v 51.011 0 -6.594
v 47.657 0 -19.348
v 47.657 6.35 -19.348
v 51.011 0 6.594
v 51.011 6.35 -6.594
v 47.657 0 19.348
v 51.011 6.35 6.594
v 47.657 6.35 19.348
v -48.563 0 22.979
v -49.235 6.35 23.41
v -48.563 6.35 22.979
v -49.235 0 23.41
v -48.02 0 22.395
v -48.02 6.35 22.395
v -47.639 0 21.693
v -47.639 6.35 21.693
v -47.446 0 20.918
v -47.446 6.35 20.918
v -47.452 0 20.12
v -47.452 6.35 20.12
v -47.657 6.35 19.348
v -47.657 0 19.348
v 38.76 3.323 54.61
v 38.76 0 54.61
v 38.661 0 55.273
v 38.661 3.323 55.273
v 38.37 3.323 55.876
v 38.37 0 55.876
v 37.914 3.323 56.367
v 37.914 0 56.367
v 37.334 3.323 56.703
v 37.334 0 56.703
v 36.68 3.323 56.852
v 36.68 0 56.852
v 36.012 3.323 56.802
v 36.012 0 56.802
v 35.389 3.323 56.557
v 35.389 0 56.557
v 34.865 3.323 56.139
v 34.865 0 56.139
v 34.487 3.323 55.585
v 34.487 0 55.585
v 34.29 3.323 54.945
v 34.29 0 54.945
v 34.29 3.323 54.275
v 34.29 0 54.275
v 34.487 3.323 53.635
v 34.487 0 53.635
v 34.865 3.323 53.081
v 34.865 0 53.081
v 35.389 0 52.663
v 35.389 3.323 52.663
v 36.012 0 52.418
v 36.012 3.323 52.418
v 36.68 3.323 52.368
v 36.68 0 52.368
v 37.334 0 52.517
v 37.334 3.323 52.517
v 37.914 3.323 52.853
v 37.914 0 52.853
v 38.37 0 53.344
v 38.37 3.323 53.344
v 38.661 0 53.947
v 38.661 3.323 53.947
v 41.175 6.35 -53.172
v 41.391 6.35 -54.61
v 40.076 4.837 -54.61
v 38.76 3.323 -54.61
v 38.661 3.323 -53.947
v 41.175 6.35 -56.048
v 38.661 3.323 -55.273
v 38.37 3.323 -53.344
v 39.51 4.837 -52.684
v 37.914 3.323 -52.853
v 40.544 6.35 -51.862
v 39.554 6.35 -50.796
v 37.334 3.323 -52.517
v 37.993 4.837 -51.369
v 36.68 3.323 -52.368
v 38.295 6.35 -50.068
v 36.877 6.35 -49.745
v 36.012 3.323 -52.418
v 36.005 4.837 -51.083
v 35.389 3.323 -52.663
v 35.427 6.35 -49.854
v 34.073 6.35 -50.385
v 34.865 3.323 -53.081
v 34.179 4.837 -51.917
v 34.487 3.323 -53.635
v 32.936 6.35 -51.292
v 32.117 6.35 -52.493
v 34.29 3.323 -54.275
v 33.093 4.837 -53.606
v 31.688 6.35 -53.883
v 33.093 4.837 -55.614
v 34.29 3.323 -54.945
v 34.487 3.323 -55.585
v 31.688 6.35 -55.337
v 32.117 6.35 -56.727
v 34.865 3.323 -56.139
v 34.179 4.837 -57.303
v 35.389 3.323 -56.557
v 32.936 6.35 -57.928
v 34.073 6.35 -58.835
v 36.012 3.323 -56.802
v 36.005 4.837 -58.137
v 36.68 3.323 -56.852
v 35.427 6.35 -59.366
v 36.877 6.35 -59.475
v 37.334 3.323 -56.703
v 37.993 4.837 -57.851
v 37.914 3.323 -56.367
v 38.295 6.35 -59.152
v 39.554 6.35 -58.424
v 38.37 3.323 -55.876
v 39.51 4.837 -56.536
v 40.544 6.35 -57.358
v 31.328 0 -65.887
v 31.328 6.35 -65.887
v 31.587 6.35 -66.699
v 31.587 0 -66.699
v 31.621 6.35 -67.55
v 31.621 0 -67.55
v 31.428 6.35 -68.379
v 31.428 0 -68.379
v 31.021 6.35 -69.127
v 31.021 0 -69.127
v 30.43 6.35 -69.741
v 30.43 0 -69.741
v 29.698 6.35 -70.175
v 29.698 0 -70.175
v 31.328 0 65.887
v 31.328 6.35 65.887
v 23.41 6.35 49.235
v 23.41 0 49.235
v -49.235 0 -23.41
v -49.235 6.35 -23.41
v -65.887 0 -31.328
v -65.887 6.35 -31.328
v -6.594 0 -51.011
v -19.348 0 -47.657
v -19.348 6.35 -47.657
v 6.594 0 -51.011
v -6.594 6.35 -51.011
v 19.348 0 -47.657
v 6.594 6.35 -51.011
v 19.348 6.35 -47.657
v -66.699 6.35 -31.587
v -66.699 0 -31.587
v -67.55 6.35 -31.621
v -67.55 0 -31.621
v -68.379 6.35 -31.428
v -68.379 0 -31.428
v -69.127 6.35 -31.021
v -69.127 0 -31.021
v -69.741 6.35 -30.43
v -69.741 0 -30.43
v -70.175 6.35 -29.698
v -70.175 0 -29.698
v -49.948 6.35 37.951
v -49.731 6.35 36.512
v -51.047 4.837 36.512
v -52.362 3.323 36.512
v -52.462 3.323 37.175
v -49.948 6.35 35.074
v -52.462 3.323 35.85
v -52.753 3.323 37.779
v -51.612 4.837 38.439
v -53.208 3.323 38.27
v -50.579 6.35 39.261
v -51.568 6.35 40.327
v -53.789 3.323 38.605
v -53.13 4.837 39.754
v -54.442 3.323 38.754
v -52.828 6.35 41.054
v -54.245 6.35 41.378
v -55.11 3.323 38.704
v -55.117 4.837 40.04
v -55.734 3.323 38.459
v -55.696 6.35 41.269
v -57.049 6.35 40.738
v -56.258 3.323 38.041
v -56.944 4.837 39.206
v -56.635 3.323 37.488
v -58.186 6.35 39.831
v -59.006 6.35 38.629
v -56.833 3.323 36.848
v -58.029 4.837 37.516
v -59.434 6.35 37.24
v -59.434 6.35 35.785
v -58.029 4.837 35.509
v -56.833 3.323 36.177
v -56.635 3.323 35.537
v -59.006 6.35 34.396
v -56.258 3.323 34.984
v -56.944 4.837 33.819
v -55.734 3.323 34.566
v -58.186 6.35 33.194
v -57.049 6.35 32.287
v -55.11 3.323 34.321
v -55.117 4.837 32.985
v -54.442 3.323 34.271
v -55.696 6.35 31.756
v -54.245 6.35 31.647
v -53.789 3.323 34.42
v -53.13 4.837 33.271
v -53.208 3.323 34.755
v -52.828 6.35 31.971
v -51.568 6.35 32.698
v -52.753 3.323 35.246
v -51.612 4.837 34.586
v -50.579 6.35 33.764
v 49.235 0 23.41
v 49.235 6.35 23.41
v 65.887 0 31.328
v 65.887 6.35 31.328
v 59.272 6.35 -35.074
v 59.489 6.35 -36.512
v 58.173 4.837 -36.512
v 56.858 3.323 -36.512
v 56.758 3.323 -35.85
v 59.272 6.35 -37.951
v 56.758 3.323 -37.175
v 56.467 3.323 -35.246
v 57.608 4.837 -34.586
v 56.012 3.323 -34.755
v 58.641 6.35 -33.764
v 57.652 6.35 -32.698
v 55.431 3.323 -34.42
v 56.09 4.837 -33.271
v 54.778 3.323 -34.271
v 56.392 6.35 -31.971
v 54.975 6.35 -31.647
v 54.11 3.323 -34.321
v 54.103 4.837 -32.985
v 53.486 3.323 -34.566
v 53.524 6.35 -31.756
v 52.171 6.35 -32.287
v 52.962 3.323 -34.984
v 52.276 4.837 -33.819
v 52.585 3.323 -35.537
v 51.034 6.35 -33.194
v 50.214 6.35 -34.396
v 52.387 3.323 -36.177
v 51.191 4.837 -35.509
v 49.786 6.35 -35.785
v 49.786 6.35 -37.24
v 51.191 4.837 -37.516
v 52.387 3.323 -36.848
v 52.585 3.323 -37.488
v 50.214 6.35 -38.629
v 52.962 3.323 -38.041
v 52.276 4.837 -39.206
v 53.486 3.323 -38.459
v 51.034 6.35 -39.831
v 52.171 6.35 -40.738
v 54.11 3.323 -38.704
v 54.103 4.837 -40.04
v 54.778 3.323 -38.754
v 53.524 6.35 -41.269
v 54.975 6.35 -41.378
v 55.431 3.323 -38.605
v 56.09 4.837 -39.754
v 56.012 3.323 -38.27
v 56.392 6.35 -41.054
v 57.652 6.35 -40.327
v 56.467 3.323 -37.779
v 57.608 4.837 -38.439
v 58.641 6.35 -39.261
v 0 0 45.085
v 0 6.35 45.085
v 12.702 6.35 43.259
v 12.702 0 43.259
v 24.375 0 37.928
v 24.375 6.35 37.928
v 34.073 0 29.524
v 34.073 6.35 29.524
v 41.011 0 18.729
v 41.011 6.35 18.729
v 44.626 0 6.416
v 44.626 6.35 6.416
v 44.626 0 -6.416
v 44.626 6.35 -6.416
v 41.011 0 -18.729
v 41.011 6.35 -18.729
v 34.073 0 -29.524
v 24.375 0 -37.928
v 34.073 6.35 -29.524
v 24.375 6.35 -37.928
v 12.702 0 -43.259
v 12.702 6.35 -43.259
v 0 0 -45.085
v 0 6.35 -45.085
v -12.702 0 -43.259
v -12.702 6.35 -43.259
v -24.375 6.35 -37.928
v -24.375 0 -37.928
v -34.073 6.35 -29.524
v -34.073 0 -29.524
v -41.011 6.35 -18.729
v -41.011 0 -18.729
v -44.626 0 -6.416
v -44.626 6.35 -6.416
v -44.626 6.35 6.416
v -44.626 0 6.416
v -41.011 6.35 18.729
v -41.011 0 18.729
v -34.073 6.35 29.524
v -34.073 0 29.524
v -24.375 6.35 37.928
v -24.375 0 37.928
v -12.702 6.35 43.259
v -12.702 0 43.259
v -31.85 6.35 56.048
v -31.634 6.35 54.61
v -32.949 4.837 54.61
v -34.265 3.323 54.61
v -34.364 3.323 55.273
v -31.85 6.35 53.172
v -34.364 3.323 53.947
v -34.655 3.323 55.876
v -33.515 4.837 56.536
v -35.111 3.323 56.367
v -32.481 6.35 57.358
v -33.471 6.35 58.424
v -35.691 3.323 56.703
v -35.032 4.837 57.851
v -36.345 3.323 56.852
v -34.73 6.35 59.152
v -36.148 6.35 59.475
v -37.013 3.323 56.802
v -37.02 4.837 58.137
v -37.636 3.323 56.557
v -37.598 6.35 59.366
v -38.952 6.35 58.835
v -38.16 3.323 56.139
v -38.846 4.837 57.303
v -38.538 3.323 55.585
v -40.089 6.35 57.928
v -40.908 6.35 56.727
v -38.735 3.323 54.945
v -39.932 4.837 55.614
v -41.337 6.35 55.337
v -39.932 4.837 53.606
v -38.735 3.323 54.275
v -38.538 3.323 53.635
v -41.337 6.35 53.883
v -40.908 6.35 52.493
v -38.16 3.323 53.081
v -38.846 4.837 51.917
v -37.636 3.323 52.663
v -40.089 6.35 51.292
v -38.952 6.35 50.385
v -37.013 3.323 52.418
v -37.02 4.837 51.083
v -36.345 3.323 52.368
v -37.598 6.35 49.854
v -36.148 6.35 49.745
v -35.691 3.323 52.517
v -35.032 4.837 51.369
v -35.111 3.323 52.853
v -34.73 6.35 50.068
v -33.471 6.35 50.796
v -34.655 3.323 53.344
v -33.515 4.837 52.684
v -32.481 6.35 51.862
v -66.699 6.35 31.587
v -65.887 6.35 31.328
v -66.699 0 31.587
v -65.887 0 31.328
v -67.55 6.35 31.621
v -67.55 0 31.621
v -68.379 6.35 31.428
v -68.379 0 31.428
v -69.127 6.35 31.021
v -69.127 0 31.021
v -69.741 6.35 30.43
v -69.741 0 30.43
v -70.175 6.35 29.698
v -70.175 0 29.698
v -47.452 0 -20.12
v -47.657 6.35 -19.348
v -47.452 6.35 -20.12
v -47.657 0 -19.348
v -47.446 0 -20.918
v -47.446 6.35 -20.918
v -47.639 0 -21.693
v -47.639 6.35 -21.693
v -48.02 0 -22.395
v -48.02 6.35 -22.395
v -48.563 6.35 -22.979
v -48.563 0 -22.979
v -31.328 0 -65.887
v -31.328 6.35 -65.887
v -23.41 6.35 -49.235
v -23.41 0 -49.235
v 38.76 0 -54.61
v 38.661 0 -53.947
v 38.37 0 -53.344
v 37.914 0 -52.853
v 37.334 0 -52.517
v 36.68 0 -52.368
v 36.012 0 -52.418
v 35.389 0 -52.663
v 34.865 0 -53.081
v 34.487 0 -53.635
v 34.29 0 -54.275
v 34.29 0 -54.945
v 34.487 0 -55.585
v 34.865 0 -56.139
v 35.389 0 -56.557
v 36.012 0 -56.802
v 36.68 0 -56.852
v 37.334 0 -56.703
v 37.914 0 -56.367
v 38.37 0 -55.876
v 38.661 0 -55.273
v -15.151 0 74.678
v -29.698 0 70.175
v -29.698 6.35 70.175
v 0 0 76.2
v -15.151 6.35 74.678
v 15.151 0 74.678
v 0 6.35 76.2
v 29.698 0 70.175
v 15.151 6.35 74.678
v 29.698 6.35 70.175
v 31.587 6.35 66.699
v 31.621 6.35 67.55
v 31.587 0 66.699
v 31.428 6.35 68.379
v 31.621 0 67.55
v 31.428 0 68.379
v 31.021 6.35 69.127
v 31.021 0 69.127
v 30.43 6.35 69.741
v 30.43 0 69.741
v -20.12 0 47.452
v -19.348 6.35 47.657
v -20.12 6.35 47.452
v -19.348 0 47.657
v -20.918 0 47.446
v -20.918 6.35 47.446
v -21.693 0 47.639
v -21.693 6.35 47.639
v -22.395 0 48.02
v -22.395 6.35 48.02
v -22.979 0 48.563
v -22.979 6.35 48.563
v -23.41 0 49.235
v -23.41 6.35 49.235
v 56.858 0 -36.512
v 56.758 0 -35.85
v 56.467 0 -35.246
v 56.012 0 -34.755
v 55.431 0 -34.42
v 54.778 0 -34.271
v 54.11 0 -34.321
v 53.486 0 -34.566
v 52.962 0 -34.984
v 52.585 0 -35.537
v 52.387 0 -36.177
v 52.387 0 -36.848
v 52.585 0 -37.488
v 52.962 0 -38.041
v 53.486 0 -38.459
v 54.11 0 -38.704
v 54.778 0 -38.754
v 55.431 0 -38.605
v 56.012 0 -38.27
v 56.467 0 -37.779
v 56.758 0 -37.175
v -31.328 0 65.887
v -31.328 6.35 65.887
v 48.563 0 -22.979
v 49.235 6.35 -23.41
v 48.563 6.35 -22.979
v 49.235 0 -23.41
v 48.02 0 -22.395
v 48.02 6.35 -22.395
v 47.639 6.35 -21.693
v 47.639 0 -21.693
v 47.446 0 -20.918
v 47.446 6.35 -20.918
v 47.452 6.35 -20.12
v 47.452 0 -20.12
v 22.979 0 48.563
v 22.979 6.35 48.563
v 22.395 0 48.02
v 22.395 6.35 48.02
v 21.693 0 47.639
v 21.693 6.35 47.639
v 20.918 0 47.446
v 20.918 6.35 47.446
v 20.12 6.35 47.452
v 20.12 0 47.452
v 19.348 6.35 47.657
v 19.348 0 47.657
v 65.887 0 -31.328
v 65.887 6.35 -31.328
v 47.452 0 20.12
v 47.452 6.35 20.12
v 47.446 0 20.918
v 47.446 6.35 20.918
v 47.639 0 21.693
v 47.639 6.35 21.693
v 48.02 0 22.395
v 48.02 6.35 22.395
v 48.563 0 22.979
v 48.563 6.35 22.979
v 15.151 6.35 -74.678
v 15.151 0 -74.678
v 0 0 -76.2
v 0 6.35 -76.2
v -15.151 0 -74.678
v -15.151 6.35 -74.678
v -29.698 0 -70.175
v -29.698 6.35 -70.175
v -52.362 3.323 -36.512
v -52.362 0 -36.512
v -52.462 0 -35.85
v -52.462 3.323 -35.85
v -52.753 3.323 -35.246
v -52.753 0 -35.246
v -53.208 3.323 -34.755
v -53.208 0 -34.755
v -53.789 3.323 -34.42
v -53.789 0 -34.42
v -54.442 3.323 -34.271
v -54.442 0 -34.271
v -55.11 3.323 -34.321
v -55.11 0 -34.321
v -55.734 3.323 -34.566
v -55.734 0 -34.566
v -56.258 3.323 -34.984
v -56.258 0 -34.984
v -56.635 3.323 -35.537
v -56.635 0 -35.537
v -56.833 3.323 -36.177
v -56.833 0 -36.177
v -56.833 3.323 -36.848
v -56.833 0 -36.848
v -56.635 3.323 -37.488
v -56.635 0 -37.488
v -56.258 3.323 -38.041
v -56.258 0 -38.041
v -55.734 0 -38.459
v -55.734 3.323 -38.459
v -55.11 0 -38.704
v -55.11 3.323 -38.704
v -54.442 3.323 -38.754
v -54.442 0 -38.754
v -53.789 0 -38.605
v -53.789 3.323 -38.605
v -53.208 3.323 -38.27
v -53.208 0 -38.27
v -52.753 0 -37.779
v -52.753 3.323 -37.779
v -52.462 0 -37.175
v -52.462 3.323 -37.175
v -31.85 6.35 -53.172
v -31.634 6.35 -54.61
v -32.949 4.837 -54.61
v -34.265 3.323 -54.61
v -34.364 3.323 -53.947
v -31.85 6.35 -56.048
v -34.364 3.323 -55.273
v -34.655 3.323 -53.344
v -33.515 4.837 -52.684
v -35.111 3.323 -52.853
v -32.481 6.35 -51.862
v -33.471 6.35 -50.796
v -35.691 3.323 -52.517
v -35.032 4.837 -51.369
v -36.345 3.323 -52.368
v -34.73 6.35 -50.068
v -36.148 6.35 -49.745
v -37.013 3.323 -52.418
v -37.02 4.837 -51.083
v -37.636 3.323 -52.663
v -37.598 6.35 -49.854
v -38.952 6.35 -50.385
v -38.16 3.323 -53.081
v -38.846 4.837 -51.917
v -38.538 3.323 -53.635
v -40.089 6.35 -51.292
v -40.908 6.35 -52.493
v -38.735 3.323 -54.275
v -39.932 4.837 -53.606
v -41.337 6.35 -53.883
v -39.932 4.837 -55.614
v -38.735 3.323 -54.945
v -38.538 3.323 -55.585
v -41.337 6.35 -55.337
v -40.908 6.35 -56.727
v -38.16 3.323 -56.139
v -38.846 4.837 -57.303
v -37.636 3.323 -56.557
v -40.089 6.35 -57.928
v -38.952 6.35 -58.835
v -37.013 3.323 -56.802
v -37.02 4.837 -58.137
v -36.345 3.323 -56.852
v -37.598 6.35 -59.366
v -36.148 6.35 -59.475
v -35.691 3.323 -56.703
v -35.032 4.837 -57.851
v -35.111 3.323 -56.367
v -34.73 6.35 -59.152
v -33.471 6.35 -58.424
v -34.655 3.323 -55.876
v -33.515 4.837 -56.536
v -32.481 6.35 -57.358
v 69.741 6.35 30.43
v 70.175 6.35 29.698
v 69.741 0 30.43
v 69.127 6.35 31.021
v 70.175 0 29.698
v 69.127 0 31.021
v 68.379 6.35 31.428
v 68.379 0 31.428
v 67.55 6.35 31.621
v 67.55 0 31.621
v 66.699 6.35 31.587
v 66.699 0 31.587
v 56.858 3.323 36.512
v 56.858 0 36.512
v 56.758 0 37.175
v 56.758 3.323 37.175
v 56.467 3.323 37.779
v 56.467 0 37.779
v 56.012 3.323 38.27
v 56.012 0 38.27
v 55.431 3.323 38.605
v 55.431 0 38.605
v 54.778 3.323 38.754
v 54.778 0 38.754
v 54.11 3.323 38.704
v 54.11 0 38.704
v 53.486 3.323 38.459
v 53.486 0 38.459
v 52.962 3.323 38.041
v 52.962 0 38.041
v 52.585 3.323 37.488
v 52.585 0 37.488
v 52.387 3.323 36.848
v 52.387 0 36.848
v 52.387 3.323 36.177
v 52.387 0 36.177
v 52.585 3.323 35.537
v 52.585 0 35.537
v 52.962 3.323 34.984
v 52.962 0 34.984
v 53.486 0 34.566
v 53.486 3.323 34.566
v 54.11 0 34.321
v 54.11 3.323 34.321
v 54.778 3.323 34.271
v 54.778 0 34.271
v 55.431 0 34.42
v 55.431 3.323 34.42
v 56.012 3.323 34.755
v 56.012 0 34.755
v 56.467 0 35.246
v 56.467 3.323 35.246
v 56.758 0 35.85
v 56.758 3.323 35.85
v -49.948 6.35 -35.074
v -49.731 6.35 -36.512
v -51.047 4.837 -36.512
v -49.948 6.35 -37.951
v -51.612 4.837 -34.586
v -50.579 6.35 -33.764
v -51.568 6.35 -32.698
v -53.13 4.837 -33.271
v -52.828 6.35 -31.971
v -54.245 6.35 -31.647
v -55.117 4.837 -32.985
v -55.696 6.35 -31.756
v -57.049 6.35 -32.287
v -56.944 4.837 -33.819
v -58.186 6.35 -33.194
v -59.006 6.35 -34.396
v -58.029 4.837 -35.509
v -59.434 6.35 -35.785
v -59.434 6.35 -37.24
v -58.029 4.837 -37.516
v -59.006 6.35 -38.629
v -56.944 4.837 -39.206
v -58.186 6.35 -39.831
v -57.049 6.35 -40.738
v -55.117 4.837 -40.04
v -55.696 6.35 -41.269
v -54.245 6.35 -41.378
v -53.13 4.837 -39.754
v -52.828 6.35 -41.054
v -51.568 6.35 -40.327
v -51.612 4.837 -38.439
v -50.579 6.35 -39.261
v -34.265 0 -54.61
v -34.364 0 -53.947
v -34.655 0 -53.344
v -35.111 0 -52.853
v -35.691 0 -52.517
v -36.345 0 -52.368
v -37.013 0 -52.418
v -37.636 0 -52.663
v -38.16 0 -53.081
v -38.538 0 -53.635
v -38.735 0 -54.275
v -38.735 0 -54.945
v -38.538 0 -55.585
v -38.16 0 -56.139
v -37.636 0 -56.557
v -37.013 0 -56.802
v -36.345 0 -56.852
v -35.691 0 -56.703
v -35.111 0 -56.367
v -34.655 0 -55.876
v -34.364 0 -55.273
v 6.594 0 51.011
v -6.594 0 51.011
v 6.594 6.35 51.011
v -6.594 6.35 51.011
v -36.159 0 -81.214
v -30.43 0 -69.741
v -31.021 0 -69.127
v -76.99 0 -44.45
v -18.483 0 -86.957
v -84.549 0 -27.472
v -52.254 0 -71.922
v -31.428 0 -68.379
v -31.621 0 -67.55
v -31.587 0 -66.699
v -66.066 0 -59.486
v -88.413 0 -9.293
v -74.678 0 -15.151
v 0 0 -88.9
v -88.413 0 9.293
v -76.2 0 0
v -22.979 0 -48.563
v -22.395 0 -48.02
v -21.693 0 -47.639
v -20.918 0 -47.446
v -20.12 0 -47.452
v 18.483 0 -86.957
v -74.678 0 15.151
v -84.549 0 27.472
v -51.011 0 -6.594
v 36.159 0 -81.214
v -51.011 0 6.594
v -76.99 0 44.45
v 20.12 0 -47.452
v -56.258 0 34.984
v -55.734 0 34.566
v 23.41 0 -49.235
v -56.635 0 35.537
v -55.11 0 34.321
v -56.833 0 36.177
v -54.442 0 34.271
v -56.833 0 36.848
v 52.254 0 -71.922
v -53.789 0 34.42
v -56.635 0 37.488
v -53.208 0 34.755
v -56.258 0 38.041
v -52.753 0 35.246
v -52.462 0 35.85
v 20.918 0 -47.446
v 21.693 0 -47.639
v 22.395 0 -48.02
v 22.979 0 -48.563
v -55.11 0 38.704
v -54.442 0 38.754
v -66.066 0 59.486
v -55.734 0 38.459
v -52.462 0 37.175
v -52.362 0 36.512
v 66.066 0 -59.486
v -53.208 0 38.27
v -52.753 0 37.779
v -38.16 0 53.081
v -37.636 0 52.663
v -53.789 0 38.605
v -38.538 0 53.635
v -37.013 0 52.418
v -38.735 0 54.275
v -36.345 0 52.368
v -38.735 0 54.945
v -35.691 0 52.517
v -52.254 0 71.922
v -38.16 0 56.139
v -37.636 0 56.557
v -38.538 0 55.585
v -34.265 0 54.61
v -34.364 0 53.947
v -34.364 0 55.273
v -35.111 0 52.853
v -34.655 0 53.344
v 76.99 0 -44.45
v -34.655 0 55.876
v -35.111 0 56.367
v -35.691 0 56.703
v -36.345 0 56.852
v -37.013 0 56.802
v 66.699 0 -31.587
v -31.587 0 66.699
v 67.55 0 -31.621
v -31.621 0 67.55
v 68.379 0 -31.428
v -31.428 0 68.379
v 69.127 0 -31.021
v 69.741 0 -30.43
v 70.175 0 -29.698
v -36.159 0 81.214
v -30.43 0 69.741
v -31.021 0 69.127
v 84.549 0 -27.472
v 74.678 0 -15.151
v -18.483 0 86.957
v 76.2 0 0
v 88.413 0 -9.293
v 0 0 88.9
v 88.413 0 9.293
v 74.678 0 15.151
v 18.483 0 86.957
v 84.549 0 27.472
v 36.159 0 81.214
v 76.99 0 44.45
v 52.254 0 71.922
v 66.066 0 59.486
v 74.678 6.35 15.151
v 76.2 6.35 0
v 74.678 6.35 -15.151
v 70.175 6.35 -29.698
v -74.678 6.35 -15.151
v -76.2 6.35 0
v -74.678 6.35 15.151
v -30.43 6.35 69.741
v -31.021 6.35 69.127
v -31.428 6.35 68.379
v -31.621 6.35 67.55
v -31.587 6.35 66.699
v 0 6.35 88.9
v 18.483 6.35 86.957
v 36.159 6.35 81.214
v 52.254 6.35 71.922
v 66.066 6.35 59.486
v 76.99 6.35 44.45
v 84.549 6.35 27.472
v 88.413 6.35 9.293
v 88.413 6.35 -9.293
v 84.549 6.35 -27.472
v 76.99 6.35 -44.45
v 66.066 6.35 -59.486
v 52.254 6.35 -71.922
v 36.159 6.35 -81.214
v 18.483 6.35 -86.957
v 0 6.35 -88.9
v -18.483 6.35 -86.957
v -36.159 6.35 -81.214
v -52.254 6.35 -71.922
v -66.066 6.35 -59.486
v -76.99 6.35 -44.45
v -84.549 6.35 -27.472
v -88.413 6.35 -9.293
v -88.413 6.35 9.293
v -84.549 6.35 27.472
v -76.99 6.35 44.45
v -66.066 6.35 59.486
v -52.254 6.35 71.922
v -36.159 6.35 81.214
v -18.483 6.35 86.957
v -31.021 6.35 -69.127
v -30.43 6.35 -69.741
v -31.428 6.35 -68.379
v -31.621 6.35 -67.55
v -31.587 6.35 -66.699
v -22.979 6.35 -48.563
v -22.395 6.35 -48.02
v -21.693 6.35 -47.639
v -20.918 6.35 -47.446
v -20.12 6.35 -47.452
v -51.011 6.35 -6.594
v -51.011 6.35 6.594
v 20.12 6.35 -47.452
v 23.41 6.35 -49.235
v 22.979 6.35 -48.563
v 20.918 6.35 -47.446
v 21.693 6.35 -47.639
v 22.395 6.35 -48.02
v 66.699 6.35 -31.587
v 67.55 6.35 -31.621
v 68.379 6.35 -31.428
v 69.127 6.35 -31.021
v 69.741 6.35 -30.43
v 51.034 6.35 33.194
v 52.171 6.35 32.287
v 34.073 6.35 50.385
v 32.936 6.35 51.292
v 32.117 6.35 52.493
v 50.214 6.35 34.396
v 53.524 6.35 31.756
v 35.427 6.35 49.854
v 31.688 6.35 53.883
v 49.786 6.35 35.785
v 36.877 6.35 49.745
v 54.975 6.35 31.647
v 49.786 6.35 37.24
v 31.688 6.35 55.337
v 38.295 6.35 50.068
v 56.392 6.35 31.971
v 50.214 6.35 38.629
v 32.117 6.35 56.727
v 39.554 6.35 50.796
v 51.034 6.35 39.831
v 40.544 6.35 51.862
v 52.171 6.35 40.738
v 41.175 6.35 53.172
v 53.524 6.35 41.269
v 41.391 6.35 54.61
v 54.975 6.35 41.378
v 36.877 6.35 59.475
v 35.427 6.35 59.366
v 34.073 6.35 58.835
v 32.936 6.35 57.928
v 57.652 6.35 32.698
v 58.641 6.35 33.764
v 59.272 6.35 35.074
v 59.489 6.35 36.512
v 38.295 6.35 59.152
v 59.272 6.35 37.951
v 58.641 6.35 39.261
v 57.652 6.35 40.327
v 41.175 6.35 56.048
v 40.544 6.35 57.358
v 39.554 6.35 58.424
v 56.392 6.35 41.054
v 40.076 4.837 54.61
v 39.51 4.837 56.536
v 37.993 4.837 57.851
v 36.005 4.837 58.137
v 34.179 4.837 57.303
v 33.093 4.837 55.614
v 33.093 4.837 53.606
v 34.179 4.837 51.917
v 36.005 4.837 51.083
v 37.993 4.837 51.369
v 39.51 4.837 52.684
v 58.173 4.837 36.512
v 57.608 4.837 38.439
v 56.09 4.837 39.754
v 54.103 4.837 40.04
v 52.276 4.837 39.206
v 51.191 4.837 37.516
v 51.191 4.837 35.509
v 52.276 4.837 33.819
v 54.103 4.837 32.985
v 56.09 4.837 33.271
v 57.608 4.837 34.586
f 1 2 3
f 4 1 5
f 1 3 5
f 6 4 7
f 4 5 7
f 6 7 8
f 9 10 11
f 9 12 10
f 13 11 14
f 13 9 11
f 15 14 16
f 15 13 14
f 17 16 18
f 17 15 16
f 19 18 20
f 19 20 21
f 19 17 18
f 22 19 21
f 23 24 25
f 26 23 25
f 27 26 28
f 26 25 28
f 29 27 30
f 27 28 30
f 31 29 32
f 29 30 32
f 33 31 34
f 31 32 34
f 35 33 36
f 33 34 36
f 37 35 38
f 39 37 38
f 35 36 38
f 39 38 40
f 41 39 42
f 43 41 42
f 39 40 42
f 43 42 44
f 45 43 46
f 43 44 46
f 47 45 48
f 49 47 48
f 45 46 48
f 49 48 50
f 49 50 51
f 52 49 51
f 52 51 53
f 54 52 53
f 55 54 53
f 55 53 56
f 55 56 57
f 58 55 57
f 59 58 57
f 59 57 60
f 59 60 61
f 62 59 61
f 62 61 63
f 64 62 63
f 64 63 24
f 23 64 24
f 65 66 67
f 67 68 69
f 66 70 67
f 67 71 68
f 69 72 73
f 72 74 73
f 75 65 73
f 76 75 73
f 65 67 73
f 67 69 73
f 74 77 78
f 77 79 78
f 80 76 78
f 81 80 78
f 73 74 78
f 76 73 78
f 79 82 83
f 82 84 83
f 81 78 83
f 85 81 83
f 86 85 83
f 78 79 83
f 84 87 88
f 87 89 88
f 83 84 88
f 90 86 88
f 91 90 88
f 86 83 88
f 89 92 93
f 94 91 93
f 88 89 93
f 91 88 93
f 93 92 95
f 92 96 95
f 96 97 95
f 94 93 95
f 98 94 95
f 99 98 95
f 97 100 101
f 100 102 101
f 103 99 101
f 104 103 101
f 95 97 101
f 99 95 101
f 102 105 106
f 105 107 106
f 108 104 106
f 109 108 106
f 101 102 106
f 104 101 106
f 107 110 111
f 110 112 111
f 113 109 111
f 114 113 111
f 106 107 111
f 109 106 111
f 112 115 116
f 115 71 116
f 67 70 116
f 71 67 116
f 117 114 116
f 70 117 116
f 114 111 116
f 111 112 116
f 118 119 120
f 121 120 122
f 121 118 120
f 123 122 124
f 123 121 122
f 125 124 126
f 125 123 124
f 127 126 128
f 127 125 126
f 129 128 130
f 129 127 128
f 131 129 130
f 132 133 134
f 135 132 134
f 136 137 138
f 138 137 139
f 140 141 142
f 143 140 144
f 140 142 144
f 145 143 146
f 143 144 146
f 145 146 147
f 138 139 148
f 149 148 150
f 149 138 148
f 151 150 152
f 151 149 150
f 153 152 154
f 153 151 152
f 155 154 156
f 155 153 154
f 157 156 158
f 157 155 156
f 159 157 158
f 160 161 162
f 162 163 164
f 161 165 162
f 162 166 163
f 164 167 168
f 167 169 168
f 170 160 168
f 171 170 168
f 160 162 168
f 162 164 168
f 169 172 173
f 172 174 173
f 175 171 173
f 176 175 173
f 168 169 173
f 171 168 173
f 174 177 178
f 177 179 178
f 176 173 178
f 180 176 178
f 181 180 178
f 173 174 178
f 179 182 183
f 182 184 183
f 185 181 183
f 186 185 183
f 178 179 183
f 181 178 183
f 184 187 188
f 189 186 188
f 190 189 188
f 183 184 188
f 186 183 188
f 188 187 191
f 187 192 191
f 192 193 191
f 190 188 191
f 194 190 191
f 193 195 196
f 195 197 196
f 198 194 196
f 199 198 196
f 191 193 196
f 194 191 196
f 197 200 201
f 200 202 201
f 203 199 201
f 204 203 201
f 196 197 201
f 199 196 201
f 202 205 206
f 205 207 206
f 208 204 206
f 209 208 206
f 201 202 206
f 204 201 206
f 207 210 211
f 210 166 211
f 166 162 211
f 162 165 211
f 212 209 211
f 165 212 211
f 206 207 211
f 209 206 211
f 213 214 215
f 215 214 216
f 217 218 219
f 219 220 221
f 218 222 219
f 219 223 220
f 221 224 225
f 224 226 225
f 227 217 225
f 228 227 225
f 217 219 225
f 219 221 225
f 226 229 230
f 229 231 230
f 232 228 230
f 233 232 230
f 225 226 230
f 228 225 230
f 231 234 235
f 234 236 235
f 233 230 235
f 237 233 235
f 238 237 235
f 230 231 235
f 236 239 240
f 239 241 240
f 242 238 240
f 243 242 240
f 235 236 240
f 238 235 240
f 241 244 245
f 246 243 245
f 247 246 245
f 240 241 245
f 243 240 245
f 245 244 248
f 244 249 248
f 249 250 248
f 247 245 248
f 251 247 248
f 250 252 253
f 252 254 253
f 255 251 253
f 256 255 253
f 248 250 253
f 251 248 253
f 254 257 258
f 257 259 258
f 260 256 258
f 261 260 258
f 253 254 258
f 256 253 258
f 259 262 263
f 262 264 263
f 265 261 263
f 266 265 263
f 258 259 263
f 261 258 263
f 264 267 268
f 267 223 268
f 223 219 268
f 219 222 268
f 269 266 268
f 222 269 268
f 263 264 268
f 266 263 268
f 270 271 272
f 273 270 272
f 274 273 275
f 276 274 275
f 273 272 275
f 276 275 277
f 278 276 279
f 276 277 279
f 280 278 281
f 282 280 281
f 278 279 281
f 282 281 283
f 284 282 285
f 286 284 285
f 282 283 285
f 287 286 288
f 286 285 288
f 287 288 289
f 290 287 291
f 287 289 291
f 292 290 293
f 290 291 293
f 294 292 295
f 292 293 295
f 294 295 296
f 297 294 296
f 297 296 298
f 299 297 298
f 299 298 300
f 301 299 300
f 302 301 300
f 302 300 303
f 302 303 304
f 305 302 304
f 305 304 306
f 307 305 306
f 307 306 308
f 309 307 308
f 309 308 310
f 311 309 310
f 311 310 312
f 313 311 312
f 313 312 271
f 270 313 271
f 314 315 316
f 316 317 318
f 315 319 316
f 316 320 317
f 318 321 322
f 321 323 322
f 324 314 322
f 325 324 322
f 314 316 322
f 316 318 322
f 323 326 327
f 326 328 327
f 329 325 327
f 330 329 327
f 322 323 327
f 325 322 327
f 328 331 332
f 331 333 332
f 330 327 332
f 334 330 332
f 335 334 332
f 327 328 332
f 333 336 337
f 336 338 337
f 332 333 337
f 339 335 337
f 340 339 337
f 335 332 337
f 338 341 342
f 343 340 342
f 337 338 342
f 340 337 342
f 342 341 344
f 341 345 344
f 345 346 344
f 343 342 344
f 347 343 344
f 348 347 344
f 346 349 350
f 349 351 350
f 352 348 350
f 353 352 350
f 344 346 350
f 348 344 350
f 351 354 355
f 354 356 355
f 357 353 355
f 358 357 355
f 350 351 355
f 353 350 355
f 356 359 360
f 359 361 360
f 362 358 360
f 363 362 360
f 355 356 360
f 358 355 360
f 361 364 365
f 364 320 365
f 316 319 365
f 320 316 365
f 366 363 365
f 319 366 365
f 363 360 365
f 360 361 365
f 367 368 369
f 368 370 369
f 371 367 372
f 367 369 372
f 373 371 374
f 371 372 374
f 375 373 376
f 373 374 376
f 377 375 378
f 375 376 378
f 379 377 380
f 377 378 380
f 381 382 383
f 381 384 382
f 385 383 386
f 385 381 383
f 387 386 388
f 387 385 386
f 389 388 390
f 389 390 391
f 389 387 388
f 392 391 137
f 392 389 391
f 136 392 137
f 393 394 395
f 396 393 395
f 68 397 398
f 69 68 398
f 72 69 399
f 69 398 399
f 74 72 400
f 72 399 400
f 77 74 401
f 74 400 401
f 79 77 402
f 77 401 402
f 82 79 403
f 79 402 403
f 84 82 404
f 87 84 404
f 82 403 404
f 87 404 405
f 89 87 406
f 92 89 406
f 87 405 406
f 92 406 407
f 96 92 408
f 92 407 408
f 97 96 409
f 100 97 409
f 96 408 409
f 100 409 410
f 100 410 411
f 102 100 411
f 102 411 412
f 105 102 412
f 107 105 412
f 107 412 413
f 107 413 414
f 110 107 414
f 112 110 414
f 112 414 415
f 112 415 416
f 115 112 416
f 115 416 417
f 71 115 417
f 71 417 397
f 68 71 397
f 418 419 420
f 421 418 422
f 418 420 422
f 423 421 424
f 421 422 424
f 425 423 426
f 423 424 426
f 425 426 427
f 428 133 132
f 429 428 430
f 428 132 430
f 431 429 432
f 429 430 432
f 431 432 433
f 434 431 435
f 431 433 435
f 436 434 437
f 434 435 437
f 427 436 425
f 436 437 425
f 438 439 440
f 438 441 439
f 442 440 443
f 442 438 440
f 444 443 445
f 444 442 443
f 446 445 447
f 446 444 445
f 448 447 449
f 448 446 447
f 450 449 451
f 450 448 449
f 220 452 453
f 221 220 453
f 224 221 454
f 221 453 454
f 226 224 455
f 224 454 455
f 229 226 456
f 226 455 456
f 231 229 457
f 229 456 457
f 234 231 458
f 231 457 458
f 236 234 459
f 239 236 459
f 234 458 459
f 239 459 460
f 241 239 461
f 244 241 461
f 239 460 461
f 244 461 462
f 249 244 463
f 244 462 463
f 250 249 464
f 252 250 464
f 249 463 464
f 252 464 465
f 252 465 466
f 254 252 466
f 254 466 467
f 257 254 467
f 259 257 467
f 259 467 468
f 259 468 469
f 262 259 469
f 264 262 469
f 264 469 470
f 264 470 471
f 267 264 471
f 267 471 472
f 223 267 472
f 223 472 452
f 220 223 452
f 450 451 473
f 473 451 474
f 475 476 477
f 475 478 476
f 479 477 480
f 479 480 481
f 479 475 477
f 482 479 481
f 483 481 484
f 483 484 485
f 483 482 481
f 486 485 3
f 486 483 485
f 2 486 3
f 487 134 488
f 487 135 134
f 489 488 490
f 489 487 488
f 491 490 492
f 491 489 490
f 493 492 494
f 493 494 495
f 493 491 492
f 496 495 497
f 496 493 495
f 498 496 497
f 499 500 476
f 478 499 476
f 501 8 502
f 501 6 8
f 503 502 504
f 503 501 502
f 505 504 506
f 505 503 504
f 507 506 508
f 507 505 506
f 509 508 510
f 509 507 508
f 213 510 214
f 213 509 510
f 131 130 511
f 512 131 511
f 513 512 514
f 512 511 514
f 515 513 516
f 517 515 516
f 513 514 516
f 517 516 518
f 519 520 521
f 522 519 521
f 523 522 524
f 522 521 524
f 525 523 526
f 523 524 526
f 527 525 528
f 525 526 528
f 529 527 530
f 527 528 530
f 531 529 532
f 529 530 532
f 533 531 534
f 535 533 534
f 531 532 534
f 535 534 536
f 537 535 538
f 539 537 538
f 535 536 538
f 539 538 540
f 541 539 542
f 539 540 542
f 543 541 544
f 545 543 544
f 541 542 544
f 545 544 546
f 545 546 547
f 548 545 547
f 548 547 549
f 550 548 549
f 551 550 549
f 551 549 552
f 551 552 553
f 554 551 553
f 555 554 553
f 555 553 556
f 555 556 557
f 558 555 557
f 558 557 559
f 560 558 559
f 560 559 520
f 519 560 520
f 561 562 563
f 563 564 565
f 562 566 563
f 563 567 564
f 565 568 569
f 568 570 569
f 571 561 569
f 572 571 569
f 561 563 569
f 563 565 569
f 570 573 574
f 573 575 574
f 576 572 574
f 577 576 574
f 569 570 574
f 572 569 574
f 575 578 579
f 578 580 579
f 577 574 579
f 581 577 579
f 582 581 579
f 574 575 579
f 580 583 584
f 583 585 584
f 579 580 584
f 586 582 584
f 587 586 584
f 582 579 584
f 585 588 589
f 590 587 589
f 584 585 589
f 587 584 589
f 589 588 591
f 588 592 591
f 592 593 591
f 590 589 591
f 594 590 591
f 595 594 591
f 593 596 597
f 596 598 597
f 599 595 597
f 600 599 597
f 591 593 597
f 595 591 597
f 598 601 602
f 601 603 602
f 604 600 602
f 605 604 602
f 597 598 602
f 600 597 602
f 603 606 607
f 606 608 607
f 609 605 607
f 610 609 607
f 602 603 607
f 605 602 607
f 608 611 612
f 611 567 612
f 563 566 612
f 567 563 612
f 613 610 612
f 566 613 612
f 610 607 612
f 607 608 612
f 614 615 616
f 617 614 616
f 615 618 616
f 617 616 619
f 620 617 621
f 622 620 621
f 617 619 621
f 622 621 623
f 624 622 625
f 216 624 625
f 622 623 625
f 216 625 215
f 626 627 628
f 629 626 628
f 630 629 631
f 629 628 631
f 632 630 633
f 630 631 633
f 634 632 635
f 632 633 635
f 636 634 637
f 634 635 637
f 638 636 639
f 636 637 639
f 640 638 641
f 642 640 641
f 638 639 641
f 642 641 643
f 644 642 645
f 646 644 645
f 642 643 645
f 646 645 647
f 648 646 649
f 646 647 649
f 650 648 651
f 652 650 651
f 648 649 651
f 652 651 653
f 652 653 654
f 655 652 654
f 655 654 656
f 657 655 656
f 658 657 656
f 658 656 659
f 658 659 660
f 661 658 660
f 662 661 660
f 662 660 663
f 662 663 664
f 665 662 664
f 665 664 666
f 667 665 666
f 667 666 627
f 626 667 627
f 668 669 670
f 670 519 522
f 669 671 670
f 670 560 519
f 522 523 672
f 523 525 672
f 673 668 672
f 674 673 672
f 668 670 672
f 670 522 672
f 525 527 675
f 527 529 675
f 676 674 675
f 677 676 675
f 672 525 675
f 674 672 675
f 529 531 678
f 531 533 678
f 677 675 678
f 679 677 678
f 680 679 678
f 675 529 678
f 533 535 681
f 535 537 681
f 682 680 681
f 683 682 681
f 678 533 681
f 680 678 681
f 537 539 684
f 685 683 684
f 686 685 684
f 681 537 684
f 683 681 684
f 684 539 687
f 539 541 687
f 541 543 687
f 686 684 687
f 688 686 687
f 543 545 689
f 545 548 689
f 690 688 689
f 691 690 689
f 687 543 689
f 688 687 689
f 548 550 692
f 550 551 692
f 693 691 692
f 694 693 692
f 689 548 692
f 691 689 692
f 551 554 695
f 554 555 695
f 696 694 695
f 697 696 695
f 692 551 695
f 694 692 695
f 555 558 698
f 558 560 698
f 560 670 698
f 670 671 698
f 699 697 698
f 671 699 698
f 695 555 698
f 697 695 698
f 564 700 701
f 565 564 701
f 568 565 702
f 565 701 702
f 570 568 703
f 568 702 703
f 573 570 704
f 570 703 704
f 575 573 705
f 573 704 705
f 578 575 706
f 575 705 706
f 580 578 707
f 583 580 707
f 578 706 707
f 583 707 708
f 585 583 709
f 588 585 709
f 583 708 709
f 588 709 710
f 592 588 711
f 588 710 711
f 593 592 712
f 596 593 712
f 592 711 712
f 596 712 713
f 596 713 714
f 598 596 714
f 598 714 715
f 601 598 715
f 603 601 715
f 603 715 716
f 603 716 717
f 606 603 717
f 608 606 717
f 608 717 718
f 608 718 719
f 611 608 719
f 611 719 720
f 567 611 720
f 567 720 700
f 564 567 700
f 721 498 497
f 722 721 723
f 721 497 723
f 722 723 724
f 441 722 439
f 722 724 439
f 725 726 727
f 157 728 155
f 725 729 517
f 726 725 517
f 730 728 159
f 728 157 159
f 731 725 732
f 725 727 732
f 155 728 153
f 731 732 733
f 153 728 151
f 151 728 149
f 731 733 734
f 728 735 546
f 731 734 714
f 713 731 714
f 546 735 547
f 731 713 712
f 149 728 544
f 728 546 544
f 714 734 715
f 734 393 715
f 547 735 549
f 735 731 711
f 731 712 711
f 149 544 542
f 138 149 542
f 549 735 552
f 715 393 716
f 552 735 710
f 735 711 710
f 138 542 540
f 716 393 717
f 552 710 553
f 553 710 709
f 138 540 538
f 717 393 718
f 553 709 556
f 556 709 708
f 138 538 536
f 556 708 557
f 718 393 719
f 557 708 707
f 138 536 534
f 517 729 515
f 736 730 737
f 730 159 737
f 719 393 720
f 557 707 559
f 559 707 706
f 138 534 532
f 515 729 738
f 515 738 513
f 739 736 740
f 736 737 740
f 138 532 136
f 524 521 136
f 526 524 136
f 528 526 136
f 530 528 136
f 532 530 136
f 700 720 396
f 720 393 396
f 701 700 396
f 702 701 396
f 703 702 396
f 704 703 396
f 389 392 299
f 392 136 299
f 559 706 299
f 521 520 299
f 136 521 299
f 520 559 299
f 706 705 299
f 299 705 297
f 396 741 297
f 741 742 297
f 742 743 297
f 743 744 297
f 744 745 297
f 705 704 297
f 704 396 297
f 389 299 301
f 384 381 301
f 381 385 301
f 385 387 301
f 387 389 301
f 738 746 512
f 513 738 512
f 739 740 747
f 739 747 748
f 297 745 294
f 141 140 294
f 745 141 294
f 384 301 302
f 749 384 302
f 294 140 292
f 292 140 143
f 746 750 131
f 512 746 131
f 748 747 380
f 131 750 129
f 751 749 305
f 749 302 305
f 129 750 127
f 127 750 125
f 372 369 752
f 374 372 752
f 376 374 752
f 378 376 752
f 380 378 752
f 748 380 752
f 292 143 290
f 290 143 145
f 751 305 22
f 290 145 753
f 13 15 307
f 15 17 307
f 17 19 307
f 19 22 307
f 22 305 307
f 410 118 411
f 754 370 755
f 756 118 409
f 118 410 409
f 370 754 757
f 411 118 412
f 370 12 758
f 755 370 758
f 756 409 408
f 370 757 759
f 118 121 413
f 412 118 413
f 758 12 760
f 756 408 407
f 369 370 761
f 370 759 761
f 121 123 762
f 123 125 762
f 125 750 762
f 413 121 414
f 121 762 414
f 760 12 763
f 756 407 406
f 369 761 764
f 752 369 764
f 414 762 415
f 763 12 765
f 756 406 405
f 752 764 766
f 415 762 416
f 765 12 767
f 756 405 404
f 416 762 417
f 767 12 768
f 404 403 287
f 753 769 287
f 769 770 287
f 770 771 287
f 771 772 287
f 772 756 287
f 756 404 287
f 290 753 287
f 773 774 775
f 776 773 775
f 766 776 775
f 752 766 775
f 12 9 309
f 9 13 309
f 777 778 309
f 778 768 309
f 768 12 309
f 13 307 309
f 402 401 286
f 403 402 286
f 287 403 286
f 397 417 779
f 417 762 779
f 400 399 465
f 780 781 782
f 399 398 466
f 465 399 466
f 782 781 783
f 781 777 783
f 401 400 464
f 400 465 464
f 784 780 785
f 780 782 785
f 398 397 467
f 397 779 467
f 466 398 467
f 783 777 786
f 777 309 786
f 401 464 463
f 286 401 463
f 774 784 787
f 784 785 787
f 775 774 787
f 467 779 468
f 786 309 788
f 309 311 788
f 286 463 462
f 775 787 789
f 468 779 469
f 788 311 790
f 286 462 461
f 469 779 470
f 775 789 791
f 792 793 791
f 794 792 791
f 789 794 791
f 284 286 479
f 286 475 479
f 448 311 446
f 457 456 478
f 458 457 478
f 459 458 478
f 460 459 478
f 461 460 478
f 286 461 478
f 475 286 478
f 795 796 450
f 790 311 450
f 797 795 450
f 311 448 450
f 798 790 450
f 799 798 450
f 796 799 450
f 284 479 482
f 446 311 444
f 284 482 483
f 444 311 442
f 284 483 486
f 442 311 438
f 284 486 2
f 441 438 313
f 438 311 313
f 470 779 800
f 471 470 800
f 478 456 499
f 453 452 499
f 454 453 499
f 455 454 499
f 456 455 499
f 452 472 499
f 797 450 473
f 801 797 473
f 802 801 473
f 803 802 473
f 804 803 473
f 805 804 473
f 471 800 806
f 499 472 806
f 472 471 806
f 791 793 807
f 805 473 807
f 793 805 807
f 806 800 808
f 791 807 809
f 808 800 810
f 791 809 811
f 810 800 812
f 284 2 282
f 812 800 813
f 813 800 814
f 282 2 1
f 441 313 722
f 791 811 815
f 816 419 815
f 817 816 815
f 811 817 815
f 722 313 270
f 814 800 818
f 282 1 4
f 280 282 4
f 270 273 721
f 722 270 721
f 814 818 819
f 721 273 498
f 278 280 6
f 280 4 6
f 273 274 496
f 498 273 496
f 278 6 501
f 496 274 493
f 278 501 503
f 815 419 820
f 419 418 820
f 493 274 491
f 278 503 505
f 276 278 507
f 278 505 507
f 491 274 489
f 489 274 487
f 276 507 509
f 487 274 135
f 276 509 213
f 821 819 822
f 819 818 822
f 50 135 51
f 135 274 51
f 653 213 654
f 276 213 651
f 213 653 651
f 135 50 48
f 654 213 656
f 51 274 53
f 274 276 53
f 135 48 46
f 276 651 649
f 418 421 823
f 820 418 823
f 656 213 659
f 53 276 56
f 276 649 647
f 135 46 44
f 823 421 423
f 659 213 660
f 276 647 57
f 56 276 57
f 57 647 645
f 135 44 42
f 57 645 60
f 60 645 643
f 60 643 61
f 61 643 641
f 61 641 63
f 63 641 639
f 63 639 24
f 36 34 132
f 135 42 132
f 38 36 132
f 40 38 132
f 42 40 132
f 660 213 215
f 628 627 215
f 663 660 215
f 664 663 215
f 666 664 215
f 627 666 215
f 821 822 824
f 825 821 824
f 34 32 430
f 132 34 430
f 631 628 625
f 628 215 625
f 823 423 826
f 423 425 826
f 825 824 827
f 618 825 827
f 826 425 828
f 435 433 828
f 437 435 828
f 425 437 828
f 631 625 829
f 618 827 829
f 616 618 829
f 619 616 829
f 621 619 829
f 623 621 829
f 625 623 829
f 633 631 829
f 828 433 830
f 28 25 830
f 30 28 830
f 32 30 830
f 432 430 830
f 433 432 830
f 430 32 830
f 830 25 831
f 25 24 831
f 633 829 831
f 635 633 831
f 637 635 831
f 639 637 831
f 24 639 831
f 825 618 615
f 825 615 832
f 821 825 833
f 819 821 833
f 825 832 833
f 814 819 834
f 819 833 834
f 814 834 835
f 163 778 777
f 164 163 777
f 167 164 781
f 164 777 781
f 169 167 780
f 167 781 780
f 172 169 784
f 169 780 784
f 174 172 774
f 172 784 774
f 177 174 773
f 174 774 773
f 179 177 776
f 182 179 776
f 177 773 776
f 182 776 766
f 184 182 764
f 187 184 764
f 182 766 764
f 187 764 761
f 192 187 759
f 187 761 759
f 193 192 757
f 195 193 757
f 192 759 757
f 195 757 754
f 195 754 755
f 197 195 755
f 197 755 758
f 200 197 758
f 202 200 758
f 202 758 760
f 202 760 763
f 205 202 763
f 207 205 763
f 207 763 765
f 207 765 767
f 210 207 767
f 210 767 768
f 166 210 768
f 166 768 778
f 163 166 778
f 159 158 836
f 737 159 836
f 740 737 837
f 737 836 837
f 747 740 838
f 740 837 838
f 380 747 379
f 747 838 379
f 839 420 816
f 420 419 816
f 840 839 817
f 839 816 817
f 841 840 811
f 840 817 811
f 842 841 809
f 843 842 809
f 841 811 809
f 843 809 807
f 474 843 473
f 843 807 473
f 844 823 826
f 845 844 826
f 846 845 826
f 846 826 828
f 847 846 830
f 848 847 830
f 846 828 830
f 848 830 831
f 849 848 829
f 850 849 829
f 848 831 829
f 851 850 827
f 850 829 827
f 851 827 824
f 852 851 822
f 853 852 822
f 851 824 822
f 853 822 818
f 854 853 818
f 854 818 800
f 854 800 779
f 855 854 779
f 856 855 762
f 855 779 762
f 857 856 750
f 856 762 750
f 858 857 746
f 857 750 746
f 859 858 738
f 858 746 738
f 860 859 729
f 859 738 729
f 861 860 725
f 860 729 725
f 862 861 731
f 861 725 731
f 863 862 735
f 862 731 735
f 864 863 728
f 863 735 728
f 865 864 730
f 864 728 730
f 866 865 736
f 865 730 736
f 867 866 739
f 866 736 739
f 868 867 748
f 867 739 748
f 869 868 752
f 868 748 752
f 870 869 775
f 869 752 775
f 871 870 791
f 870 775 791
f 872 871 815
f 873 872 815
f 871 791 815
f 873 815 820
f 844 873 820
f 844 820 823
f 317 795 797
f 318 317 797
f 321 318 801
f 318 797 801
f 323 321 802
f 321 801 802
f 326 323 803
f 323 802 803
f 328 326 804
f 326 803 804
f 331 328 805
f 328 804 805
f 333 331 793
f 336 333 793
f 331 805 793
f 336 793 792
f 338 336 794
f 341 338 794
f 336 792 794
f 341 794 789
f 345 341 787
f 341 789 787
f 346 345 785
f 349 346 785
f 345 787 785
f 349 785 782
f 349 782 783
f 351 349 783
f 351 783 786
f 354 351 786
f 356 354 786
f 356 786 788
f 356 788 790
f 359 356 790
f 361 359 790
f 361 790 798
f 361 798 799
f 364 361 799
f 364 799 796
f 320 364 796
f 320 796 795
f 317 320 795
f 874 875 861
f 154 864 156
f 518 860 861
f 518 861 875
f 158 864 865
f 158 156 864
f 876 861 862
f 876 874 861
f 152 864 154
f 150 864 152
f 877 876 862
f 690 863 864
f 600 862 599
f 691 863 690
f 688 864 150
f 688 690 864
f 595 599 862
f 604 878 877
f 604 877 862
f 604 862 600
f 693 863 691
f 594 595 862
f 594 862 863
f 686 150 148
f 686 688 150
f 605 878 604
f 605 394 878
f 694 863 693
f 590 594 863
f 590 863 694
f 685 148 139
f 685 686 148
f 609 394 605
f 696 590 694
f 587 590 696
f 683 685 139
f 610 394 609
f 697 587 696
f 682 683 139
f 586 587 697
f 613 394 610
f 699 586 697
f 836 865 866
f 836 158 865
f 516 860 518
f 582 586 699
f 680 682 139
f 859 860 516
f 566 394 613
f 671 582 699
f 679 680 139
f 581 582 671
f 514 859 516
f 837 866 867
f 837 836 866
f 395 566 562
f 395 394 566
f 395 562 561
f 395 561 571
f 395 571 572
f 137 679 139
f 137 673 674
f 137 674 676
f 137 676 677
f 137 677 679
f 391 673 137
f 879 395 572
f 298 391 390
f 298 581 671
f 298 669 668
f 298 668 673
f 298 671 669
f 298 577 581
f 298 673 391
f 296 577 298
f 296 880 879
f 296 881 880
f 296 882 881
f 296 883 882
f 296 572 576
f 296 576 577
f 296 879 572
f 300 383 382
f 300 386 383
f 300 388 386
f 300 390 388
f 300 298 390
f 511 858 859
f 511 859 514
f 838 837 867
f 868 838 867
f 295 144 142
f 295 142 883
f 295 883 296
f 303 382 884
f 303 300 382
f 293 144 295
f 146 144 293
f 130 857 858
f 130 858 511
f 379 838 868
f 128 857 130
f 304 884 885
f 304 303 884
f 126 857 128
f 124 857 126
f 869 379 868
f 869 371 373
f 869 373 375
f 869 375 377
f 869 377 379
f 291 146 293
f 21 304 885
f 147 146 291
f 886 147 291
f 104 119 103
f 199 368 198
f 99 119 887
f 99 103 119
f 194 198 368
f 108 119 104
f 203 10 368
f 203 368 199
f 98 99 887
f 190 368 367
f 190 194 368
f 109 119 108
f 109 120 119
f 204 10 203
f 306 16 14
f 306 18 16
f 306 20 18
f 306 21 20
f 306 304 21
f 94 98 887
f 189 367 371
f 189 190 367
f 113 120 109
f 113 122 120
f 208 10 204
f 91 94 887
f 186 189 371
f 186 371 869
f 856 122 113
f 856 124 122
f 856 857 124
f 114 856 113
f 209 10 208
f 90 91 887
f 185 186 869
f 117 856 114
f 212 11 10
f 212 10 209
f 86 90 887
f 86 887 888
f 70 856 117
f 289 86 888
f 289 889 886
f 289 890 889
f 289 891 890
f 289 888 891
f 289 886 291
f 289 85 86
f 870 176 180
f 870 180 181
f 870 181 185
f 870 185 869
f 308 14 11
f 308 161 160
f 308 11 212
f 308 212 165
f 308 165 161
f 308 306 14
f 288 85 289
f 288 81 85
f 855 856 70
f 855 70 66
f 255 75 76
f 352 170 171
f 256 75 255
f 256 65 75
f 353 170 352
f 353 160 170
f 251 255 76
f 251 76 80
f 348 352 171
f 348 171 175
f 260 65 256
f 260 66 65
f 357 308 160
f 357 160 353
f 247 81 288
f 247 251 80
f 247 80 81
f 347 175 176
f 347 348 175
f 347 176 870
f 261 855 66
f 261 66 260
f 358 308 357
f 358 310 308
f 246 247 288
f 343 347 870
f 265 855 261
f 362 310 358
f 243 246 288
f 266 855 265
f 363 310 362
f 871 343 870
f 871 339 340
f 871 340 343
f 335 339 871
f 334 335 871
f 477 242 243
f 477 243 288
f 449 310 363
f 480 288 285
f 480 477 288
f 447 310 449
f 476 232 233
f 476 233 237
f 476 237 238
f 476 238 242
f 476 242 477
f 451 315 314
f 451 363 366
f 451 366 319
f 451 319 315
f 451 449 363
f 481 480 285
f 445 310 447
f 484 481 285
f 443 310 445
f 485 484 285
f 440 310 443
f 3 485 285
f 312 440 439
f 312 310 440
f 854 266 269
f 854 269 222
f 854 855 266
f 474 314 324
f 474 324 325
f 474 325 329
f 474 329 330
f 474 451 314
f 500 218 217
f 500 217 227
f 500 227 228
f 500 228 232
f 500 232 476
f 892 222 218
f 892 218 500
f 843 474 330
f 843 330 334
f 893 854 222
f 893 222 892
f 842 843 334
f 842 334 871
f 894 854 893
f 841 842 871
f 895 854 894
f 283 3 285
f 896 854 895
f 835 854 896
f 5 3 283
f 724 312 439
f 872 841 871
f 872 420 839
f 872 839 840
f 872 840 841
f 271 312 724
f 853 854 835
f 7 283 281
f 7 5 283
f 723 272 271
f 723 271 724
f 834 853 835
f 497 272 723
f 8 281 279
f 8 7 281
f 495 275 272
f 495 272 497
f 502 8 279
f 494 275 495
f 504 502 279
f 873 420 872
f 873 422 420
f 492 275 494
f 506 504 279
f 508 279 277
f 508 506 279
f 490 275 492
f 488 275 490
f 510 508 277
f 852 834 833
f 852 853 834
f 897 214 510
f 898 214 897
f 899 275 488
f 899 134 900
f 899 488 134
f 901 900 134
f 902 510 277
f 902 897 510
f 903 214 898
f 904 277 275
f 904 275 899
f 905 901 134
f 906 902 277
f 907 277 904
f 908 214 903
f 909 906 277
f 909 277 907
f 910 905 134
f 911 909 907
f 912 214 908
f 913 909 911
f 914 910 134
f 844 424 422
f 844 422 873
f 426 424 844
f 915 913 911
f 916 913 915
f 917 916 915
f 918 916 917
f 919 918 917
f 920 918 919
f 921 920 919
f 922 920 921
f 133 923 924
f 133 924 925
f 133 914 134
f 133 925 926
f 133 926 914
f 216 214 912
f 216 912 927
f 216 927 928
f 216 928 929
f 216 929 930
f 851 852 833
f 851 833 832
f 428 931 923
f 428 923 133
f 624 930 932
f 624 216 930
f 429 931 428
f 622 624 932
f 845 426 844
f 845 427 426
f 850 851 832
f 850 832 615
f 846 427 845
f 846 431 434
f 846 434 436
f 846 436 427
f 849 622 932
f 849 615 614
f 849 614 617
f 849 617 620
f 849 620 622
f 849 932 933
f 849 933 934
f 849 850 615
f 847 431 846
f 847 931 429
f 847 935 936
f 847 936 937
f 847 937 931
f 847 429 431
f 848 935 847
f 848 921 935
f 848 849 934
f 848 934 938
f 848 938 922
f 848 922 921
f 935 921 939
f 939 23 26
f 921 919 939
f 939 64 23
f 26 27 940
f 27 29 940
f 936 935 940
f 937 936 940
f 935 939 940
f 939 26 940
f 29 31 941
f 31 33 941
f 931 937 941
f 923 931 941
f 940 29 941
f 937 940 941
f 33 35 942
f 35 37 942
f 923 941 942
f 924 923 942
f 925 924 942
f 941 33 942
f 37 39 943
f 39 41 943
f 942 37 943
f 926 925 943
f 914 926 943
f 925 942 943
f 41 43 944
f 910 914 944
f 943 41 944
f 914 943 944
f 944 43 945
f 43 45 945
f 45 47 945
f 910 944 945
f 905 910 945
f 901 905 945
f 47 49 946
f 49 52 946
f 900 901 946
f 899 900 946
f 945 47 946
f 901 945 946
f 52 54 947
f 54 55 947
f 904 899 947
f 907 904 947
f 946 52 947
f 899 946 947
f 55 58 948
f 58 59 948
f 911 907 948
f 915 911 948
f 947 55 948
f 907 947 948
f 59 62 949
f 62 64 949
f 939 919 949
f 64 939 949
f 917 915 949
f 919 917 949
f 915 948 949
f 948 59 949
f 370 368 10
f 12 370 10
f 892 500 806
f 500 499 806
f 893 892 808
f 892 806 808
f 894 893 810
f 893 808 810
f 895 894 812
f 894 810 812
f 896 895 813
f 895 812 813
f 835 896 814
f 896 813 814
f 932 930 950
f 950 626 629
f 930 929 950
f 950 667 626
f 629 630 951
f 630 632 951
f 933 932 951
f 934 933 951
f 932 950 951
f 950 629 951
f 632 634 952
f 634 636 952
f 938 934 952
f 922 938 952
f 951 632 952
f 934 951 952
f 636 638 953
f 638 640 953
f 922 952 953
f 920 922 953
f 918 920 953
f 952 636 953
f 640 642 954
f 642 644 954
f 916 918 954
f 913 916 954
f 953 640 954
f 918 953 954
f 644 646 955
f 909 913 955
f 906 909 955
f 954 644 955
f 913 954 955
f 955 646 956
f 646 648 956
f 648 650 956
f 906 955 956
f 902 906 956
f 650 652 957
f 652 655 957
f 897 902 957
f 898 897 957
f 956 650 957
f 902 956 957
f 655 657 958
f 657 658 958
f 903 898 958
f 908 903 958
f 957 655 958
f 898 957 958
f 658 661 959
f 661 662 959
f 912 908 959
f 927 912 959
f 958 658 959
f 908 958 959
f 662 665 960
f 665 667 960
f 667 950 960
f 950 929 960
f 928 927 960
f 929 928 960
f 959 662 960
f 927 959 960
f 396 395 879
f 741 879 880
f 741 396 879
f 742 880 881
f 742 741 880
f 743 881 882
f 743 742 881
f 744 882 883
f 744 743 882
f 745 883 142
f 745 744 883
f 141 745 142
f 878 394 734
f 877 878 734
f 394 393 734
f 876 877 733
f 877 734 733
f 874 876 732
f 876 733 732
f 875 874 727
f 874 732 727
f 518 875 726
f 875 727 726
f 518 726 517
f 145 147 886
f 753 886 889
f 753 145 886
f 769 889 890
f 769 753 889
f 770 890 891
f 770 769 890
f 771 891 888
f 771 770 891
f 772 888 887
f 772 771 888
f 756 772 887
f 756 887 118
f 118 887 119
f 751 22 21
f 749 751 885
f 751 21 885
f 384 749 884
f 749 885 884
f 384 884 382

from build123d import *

# Parameters (mm, degrees)
SKETCH1_R                                      = 88.9
BOSS_EXTRUDE1_DEPTH                            = 6.35
CSK_FOR_8_FLAT_HEAD_MACHINE_SCREW1_D           = 4.4958
CSK_FOR_8_FLAT_HEAD_MACHINE_SCREW1_CSINK_D     = 9.7576132
CSK_FOR_8_FLAT_HEAD_MACHINE_SCREW1_CSINK_ANGLE = 82
CIRPATTERN1_COUNT                              = 2
SKETCH4_R                                      = 45.085
CUT_EXTRUDE1_DEPTH                             = 126.88384527
CUT_EXTRUDE2_DEPTH                             = 126.88384527
FILLET1_R                                      = 3.175
CIRPATTERN2_COUNT                              = 4
FILLET1_OF_CIRPATTERN2_R                       = 3.175


with BuildPart() as part:
    # Sketch1 → Boss-Extrude1 (new body)
    with BuildSketch(Plane(origin=(0, 0, 0), x_dir=(1, 0, 0), z_dir=(0, 1, 0))):
        with Locations(Location((0, 0, 0), (0, 0, 270))):
            Circle(SKETCH1_R)
    extrude(amount=BOSS_EXTRUDE1_DEPTH)

    # CSK for #8 Flat Head Machine Screw1 (through all)
    with Locations(Plane(origin=(0, 6.35, 0), x_dir=(-1, 0, 0), z_dir=(0, 1, 0))):
        with Locations((36.5125, -54.61), (-36.5125, -54.61), (36.5125, 54.61), (-36.5125, 54.61), (-54.61, -36.5125), (-54.61, 36.5125), (54.61, 36.5125), (54.61, -36.5125)):
            csk_for_8_flat_head_machine_screw1 = CounterSinkHole(CSK_FOR_8_FLAT_HEAD_MACHINE_SCREW1_D / 2, CSK_FOR_8_FLAT_HEAD_MACHINE_SCREW1_CSINK_D / 2, counter_sink_angle=CSK_FOR_8_FLAT_HEAD_MACHINE_SCREW1_CSINK_ANGLE)

    # CirPattern1: CSK for #8 Flat Head Machine Screw1 ×2 about axis
    cirpattern1_axis = Axis((0, 0, 0), (0, 1, 0))
    for i in range(1, CIRPATTERN1_COUNT):
        add(csk_for_8_flat_head_machine_screw1.rotate(cirpattern1_axis, i * 360 / CIRPATTERN1_COUNT), mode=Mode.SUBTRACT)

    # Sketch4 → Cut-Extrude1 (cut, through all)
    with BuildSketch(Plane(origin=(0, 6.35, 0), x_dir=(1, 0, 0), z_dir=(0, 1, 0))):
        with Locations(Location((0, 0, 0), (0, 0, 270))):
            Circle(SKETCH4_R)
    extrude(amount=-CUT_EXTRUDE1_DEPTH, mode=Mode.SUBTRACT)

    # Sketch5 → Cut-Extrude2 (cut, through all)
    with BuildSketch(Plane(origin=(0, 6.35, 0), x_dir=(1, 0, 0), z_dir=(0, 1, 0))):
        with BuildLine():
            Line((-68.817101203, -32.720736269), (-46.451543312, -22.086496982))
            ThreePointArc((-46.451543312, -22.086496982), (-51.435, 0), (-46.451543312, 22.086496982))
            Line((-46.451543312, 22.086496982), (-68.817101203, 32.720736269))
            ThreePointArc((-68.817101203, 32.720736269), (-76.2, 0), (-68.817101203, -32.720736269))
        make_face()
    cut_extrude2 = extrude(amount=-CUT_EXTRUDE2_DEPTH, mode=Mode.SUBTRACT)

    # Fillet1
    fillet1_edges = [part.edges().sort_by_distance(p)[0] for p in [
        (-68.817101203, 3.175, 32.720736269),
        (-68.817101203, 3.175, -32.720736269),
        (-46.451543312, 3.175, -22.086496982),
        (-46.451543312, 3.175, 22.086496982),
    ]]
    fillet(fillet1_edges, radius=FILLET1_R)

    # CirPattern2: Cut-Extrude2 ×4 about axis
    cirpattern2_axis = Axis((0, 0, 0), (0, 1, 0))
    for i in range(1, CIRPATTERN2_COUNT):
        add(cut_extrude2.rotate(cirpattern2_axis, i * 360 / CIRPATTERN2_COUNT), mode=Mode.SUBTRACT)

    # Fillet1 of CirPattern2
    fillet1_of_cirpattern2_edges = [part.edges().sort_by_distance(p)[0] for p in [
        (32.720736269, 3.175, 68.817101203),
        (-32.720736269, 3.175, 68.817101203),
        (-22.086496982, 3.175, 46.451543312),
        (22.086496982, 3.175, 46.451543312),
        (68.817101203, 3.175, -32.720736269),
        (68.817101203, 3.175, 32.720736269),
        (46.451543312, 3.175, 22.086496982),
        (46.451543312, 3.175, -22.086496982),
        (-32.720736269, 3.175, -68.817101203),
        (32.720736269, 3.175, -68.817101203),
        (22.086496982, 3.175, -46.451543312),
        (-22.086496982, 3.175, -46.451543312),
    ]]
    fillet(fillet1_of_cirpattern2_edges, radius=FILLET1_OF_CIRPATTERN2_R)


solid = part.part
